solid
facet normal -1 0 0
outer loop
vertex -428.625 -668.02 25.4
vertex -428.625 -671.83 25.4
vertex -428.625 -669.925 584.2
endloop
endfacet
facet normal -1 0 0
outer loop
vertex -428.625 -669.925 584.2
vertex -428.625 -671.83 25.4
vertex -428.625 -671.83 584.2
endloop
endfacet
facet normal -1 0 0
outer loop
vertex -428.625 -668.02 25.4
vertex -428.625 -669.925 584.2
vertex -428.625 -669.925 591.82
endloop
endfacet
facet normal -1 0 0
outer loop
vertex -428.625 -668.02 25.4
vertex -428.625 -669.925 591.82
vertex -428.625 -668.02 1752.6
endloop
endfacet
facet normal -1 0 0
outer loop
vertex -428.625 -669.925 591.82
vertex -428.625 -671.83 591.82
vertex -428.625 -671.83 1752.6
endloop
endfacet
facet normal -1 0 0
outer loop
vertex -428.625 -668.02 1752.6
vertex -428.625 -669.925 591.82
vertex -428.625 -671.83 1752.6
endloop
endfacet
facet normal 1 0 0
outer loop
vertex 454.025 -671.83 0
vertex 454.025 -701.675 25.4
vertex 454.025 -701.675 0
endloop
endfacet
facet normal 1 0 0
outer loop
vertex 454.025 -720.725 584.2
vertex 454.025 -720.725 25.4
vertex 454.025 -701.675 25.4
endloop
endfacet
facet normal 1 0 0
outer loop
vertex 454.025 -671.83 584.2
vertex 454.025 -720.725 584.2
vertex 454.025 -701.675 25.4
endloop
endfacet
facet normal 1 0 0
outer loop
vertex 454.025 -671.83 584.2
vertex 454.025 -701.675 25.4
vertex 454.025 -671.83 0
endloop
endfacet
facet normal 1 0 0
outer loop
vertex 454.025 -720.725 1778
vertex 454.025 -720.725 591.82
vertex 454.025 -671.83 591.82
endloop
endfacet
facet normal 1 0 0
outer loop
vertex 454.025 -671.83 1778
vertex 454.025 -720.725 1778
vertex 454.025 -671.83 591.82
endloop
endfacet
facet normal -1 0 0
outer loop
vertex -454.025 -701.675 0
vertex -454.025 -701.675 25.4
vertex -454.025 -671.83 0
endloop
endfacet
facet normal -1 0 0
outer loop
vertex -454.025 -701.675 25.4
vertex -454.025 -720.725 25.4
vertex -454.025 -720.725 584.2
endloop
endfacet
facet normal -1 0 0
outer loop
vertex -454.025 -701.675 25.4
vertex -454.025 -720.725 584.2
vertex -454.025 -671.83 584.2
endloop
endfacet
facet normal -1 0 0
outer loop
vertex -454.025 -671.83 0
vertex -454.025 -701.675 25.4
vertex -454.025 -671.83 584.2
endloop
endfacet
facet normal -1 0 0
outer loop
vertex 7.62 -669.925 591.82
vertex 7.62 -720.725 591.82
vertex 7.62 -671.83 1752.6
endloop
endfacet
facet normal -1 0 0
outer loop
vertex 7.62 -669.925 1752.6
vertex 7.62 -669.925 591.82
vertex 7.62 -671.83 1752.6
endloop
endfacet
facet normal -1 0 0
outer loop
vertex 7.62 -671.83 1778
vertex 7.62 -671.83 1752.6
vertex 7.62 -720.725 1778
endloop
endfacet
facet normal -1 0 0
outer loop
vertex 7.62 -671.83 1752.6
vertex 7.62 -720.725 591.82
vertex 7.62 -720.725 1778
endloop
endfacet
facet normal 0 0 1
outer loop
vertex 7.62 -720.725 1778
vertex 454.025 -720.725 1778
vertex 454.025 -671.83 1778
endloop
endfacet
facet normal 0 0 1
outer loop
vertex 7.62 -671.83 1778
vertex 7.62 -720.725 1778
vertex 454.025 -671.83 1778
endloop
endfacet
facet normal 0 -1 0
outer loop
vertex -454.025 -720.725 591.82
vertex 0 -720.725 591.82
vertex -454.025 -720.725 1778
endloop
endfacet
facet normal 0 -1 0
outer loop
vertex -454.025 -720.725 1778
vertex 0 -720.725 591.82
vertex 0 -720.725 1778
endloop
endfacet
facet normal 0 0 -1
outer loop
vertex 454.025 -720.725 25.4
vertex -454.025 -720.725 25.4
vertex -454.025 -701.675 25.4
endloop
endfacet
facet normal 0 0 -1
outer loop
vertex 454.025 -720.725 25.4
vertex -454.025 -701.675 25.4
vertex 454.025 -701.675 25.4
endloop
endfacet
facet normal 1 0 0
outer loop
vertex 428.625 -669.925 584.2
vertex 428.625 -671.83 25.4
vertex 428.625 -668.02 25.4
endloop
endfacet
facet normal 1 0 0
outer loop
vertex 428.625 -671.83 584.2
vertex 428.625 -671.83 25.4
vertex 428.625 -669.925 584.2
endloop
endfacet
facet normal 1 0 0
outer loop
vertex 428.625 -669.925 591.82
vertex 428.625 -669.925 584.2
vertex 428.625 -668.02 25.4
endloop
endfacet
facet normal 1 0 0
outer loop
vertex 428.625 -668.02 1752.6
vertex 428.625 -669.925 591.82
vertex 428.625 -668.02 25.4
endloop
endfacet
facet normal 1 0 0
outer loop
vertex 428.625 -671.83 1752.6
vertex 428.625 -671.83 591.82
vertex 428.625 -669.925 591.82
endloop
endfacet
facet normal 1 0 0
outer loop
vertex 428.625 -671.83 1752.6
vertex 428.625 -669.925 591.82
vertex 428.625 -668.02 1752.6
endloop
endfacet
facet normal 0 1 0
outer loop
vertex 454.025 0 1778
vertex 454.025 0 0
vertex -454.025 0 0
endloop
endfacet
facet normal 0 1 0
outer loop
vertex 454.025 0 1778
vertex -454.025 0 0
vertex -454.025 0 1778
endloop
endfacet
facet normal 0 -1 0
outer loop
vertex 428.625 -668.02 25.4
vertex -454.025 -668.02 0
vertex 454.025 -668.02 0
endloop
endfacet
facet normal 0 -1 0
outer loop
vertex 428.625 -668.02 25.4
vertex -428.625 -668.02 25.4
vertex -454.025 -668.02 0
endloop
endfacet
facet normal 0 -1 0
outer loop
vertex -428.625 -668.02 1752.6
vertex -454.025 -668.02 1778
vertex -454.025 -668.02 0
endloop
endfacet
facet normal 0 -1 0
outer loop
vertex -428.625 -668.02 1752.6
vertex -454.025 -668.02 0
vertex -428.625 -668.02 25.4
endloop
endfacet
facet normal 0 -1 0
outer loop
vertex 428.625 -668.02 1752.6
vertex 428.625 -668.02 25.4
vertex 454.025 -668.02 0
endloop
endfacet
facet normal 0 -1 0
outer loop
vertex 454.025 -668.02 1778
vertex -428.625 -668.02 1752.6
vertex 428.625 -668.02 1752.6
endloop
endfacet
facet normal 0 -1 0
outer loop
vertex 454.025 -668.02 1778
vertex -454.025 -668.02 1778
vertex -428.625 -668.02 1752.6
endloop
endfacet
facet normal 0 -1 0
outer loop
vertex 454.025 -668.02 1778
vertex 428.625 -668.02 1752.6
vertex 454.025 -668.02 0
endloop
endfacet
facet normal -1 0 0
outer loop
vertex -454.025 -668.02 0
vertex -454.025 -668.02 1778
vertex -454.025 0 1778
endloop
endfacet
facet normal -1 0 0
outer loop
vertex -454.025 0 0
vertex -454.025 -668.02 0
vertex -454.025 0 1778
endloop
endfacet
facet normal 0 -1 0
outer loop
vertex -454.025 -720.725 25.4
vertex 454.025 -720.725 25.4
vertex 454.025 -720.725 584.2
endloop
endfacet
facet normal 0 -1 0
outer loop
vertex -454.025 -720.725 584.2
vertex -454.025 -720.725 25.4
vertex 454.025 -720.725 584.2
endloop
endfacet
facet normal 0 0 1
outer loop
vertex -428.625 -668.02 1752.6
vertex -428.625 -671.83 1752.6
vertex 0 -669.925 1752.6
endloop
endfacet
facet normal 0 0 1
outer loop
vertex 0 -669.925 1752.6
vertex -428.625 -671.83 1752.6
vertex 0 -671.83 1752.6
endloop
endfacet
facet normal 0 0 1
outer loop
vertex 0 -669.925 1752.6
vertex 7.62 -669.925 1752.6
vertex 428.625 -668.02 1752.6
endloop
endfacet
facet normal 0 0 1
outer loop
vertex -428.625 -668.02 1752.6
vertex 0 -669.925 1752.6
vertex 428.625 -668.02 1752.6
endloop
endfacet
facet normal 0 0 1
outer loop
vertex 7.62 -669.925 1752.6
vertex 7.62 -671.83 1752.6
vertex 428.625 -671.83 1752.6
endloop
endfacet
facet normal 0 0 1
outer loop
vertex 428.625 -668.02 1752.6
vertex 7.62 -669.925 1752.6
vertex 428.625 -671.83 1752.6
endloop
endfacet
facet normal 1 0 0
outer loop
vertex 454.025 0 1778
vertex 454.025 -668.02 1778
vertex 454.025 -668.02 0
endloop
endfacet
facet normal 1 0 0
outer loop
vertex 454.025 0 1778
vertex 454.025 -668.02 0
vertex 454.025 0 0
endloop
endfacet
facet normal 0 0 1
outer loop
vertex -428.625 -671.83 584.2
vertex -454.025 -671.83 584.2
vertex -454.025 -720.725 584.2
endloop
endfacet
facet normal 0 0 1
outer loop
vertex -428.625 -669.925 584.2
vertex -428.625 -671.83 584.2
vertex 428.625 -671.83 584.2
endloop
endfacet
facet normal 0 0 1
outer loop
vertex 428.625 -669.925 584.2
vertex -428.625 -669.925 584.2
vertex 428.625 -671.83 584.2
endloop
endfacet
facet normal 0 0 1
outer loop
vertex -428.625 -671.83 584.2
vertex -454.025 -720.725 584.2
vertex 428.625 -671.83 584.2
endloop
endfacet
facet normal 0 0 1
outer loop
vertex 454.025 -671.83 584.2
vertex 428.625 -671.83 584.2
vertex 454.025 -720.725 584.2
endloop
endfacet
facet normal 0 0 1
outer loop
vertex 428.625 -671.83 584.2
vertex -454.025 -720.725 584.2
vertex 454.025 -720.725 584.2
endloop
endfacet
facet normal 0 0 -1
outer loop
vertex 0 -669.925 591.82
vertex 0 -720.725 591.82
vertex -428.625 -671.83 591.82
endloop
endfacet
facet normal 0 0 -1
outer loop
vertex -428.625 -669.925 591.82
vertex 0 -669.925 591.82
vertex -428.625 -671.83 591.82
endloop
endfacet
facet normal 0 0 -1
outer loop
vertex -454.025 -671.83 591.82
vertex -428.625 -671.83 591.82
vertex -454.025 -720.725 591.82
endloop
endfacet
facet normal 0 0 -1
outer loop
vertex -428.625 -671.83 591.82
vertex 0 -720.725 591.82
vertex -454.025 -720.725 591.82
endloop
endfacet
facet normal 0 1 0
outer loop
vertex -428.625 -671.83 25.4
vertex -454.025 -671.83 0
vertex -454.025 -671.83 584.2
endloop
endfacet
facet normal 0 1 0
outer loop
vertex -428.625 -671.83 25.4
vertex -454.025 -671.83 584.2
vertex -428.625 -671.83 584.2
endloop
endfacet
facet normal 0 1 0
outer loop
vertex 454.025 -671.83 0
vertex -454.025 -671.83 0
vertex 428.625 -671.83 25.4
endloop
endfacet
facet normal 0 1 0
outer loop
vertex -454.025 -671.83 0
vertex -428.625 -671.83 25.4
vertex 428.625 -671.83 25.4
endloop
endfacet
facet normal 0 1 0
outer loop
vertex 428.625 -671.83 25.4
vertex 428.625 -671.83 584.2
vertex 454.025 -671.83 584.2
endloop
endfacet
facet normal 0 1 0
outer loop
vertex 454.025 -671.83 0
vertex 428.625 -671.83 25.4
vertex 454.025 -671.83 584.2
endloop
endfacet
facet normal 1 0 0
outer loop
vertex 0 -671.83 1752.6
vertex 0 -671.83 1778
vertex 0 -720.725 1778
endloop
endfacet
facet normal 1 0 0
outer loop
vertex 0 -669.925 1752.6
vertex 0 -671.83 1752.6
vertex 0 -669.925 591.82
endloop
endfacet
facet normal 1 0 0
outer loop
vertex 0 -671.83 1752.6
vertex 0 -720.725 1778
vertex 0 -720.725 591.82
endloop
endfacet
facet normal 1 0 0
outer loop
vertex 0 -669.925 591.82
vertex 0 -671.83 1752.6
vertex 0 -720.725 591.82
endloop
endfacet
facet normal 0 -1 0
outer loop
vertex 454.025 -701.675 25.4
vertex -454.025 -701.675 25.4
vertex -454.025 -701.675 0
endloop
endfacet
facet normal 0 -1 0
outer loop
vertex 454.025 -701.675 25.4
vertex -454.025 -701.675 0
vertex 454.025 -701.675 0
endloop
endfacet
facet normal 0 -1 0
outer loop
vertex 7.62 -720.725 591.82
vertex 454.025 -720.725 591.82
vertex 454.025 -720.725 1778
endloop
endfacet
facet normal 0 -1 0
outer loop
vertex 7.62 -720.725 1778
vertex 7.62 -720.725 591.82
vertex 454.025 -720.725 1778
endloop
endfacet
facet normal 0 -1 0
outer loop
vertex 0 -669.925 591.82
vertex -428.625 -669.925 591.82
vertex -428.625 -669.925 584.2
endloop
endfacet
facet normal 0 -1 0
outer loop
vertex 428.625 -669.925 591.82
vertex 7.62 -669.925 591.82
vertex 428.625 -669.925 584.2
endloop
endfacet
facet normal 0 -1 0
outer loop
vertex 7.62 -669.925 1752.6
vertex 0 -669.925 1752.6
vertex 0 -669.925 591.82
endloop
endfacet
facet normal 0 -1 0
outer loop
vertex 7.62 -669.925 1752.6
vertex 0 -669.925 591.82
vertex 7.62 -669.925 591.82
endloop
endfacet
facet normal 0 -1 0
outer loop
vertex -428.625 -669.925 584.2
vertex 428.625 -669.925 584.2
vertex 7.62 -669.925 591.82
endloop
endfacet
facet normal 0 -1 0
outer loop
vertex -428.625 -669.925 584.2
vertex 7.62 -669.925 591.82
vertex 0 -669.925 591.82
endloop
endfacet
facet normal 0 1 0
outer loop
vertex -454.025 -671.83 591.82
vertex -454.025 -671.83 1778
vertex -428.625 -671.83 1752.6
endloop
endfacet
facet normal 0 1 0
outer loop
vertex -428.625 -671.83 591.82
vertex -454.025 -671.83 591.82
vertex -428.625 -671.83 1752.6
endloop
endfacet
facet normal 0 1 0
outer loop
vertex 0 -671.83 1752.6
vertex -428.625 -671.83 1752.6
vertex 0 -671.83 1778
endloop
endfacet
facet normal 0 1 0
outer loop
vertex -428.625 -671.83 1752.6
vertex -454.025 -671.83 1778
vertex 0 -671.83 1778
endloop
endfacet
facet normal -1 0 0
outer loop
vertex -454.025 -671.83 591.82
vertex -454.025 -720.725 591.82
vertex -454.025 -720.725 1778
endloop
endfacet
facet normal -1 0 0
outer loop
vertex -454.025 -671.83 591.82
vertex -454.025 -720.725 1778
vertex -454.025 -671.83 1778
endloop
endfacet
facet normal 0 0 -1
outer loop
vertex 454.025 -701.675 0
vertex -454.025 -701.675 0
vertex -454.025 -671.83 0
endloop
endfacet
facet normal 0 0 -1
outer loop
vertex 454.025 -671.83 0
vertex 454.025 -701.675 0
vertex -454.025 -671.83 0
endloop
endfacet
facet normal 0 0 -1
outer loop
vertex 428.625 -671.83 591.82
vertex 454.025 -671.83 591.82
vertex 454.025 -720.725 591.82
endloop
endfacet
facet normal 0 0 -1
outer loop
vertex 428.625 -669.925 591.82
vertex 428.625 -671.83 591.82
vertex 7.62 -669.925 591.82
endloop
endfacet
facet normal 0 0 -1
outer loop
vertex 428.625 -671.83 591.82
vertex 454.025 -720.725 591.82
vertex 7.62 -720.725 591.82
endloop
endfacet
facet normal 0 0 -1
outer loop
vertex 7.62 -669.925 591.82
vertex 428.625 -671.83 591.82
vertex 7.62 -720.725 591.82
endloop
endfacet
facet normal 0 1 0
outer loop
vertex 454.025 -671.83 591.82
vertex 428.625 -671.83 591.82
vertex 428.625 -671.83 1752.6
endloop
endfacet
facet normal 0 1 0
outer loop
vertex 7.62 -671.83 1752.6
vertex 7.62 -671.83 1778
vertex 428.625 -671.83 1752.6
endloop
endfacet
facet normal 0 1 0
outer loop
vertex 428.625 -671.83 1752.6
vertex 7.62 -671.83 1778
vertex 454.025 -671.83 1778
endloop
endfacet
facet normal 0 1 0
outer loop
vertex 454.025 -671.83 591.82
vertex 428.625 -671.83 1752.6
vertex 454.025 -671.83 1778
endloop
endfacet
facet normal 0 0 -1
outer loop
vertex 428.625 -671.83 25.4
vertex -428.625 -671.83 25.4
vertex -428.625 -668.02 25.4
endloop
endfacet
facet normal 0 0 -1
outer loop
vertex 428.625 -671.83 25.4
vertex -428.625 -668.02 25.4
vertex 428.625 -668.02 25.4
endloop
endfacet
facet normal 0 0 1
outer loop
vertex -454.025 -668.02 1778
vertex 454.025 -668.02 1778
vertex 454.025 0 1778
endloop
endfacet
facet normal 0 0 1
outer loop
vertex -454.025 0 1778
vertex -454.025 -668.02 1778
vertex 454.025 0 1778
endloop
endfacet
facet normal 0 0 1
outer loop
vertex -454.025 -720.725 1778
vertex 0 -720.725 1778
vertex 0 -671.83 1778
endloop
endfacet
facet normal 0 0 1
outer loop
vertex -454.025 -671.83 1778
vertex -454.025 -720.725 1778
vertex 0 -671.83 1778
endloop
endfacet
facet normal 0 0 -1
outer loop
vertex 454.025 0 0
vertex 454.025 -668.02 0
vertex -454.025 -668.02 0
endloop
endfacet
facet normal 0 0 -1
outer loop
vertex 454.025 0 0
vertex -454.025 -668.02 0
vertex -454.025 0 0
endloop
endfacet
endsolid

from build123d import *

# Parameters (mm, degrees)
F0_W     = 720.725
F0_H     = 1778
F1_DEPTH = 454.025
F3_W     = 908.05
F3_H     = 1778
F3_W_2   = 857.25
F3_H_2   = 1727.2
F4_DEPTH = 1.905
F7_DEPTH = 50.8
F5_W     = 908.05
F5_H     = 25.4
F8_DEPTH = 19.05


with BuildPart() as f1:
    # F0 (on Right) → F1 (new body, symmetric)
    with BuildSketch(Plane.YZ):
        with Locations((-360.3625, 889)):
            Rectangle(F0_W, F0_H)
    extrude(amount=F1_DEPTH, both=True)

    # F3 (on offset) → F4 (cut, symmetric)
    with BuildSketch(Plane.XZ.offset(669.925)):
        with Locations((0, 889)):
            Rectangle(F3_W, F3_H)
        with Locations((0, 889)):
            Rectangle(F3_W_2, F3_H_2, mode=Mode.SUBTRACT)
    extrude(amount=F4_DEPTH, both=True, mode=Mode.SUBTRACT)

    # F6 (on face) → F7 (cut)
    with BuildSketch(Plane.XZ.offset(720.725)):
        Polygon((7.62, 1778), (0, 1778), (0, 591.82), (-480.0681769848, 591.82), (-480.0681769848, 584.2), (491.1567866802, 584.2), (491.1567866802, 591.82), (7.62, 591.82), align=None)
    extrude(amount=-F7_DEPTH, mode=Mode.SUBTRACT)

    # F5 (on face) → F8 (cut)
    with BuildSketch(Plane.XZ.offset(720.725)):
        with Locations((0, 12.7)):
            Rectangle(F5_W, F5_H)
    extrude(amount=-F8_DEPTH, mode=Mode.SUBTRACT)


solid = f1.part
